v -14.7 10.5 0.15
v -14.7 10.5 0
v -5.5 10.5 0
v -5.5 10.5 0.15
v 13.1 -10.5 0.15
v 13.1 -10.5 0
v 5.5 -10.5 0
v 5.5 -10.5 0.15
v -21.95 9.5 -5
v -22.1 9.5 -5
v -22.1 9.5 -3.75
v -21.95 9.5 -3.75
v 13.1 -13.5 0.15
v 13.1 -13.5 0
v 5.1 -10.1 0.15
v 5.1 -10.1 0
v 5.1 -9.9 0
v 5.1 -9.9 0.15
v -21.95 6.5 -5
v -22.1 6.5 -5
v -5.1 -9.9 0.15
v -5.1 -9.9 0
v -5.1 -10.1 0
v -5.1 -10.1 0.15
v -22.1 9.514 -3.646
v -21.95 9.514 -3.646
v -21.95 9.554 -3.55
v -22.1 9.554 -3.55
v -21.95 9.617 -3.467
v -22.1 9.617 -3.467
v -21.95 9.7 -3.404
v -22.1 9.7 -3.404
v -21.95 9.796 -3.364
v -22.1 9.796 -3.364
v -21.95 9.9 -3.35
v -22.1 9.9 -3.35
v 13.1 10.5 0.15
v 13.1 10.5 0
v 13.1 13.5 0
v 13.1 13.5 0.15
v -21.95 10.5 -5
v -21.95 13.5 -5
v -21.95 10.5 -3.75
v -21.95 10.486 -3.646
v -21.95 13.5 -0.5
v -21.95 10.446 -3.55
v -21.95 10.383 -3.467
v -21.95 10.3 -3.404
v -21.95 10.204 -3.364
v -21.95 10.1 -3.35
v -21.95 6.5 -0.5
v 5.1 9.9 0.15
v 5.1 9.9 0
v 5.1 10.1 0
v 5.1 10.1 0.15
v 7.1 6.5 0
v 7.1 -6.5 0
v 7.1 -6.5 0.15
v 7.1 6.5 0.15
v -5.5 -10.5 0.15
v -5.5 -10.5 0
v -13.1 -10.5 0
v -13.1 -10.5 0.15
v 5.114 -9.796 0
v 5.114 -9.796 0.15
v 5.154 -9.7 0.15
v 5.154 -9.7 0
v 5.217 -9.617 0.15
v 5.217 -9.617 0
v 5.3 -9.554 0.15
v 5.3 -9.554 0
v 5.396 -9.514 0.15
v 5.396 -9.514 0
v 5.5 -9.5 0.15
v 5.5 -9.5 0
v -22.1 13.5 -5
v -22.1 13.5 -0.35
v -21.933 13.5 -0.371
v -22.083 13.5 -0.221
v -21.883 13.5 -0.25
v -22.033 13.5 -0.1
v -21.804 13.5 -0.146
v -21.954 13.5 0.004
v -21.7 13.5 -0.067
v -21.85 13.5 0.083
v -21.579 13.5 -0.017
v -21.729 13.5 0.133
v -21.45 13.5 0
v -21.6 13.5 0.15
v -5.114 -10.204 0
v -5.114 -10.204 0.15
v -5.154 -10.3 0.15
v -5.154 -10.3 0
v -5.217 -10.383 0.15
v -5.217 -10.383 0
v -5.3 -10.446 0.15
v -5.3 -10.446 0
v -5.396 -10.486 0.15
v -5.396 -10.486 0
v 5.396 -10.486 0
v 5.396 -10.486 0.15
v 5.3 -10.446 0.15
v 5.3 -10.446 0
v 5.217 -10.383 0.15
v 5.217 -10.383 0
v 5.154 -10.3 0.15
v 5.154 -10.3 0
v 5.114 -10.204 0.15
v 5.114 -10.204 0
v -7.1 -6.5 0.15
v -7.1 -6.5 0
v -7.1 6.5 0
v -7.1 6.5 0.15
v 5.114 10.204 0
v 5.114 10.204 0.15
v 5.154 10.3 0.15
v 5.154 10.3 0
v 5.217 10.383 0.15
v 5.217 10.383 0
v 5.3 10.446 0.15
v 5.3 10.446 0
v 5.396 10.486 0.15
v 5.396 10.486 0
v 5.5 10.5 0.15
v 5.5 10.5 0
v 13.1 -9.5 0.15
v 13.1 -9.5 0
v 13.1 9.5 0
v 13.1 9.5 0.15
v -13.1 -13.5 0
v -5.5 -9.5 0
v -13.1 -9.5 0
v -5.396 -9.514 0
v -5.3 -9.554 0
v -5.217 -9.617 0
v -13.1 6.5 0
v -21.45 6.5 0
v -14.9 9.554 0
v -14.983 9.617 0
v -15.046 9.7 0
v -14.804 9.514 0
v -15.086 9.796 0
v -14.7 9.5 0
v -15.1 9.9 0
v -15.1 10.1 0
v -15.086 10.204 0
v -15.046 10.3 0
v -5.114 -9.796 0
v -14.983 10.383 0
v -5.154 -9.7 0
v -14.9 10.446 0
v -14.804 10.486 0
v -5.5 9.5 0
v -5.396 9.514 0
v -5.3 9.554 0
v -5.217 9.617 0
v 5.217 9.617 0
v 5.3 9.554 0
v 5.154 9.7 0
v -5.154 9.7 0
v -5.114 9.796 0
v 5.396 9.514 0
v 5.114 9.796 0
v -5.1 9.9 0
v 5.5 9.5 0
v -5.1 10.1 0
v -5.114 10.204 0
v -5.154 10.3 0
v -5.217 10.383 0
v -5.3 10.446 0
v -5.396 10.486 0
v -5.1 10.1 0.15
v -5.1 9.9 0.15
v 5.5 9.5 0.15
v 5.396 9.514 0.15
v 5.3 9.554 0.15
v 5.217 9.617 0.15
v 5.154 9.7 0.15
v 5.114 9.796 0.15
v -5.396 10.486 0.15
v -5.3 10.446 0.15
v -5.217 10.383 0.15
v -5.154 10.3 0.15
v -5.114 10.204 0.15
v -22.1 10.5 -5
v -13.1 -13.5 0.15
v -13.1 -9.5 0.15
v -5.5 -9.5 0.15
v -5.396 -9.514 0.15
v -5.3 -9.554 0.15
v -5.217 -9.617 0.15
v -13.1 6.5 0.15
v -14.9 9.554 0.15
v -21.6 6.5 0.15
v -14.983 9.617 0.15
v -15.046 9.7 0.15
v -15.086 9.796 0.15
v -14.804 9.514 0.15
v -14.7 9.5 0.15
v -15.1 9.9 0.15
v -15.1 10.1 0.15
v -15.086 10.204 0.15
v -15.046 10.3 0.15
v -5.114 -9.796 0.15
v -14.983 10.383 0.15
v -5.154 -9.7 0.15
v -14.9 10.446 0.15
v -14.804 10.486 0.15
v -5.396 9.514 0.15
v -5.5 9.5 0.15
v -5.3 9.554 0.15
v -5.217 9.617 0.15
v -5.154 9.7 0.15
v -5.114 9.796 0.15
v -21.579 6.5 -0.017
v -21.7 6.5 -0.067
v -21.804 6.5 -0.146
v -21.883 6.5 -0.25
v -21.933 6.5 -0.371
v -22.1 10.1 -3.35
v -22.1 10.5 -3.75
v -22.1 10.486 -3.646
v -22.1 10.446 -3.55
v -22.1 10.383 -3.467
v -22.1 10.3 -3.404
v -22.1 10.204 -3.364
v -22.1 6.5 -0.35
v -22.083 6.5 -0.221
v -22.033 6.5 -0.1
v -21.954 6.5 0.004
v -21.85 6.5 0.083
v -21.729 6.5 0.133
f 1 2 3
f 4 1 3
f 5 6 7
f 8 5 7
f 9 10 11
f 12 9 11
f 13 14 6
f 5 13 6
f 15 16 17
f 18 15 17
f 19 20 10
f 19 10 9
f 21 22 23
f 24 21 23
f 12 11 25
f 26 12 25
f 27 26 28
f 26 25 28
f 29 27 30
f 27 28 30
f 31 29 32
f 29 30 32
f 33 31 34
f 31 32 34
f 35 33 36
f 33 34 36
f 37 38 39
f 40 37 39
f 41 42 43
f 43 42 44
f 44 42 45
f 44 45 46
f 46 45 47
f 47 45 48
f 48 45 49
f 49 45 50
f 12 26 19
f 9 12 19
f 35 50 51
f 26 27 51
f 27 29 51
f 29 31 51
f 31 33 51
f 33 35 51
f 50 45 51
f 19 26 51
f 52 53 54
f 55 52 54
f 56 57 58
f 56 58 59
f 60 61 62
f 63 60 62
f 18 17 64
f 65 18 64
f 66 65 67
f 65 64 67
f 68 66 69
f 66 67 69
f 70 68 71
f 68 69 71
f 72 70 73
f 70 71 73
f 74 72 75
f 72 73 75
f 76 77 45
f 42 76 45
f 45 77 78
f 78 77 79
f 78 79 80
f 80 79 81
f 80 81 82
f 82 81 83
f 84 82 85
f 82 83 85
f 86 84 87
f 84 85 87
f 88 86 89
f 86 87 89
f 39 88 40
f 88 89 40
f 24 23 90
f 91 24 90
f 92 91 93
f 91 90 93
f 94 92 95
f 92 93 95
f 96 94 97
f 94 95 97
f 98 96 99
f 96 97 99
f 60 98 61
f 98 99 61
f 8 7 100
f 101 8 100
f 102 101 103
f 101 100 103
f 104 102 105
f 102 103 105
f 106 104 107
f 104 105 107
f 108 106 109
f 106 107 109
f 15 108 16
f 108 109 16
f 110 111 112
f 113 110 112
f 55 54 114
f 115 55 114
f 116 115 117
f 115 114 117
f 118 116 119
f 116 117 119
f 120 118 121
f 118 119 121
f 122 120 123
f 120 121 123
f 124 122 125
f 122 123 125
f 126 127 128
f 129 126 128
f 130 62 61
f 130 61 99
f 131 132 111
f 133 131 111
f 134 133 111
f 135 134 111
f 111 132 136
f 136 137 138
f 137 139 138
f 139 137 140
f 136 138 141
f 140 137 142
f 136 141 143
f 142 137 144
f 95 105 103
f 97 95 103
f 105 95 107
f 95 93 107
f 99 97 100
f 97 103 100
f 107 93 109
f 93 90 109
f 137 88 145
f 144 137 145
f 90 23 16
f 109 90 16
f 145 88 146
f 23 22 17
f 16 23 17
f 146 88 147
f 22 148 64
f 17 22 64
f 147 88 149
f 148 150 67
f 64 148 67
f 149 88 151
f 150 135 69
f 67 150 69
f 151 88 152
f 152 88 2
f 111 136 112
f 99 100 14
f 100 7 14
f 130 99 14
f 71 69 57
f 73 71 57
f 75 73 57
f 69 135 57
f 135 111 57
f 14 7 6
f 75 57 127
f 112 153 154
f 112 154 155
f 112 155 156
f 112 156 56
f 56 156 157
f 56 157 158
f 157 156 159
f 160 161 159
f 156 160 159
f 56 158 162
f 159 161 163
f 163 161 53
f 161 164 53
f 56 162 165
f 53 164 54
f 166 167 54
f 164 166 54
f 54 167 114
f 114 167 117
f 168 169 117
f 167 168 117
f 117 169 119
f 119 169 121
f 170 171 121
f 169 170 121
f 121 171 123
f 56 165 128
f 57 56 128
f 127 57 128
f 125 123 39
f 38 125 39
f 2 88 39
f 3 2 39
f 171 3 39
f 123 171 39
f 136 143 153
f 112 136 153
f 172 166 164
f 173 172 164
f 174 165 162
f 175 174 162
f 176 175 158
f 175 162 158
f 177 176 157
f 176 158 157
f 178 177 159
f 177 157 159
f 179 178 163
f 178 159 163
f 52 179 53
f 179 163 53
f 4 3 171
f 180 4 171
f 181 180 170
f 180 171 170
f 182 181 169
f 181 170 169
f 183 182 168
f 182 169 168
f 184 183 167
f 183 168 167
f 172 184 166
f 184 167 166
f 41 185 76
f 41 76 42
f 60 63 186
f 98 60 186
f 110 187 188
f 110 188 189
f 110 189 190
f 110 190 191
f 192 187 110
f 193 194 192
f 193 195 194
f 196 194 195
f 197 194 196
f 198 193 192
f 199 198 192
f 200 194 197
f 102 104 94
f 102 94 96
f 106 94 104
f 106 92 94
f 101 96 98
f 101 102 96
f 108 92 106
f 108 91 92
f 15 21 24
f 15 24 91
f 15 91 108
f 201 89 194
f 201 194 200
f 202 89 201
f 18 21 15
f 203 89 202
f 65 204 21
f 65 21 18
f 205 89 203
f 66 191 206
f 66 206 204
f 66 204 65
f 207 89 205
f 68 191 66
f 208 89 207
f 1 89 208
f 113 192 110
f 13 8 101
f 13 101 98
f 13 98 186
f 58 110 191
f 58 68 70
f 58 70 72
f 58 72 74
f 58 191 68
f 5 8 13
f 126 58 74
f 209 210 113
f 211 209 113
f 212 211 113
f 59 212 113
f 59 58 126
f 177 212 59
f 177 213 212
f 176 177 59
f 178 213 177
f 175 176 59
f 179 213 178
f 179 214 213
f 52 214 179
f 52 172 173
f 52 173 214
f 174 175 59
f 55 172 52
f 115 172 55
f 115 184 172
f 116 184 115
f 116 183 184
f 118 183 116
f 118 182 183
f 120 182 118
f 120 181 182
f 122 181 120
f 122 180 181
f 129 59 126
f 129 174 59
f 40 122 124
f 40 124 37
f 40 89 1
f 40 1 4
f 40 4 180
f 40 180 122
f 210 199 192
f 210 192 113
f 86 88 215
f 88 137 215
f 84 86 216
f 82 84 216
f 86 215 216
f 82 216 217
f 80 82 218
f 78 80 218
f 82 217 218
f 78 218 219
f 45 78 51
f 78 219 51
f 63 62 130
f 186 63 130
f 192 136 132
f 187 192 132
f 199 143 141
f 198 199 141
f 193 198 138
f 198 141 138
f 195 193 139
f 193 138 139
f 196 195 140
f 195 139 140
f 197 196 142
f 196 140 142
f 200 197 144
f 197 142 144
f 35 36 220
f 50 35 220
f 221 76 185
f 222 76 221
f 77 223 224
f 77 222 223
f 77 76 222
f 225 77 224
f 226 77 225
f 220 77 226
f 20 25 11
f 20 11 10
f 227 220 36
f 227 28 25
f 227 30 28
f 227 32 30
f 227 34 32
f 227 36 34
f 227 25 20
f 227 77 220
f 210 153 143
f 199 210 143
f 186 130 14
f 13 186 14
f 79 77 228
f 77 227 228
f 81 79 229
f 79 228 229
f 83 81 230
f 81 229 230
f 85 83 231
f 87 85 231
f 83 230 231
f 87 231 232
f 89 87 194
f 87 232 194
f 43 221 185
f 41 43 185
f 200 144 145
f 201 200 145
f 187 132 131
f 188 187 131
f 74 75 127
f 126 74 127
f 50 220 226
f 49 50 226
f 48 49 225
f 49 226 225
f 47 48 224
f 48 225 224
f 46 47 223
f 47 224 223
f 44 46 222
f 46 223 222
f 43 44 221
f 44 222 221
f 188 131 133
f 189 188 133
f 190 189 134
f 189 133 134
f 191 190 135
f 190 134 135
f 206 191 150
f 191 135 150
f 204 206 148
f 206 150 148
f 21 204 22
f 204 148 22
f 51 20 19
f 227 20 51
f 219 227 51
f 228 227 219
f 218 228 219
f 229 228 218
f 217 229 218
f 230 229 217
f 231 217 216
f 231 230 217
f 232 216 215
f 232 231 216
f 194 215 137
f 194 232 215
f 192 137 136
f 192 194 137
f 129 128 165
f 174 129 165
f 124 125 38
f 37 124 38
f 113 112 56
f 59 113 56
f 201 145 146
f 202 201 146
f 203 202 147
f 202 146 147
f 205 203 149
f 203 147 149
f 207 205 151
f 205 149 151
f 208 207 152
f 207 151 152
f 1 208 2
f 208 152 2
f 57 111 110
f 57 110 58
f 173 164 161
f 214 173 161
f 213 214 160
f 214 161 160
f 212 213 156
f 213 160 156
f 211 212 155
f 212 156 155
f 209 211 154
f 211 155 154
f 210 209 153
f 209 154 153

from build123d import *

# Parameters (mm, degrees)
F0_W     = 14.2
F0_H     = 13
F1_DEPTH = 0.15
F2_W     = 0.15
F2_H     = 7
F3_DEPTH = 5
F4_R     = 0.5
F6_DEPTH = 25


# Not quite as in the source:
# - a feature names something its author has since deleted; it is built from what else it names


with BuildPart() as f1:
    # F0 (on Top) → F1 (new body)
    with BuildSketch(Plane.XY):
        with BuildLine():
            Line((-13.1, 10.5), (-13.1, 13.5))
            Line((-13.1, 13.5), (-22.1, 13.5))
            Line((-22.1, 13.5), (-22.1, 6.5))
            Line((-22.1, 6.5), (-13.1, 6.5))
            Line((-13.1, 6.5), (-13.1, 9.5))
            Line((-13.1, 9.5), (-14.7, 9.5))
            ThreePointArc((-14.7, 9.5), (-14.9828427125, 9.6171572875), (-15.1, 9.9))
            Line((-15.1, 9.9), (-15.1, 10.1))
            ThreePointArc((-15.1, 10.1), (-14.9828427125, 10.3828427125), (-14.7, 10.5))
            Line((-14.7, 10.5), (-13.1, 10.5))
        make_face()
        with BuildLine():
            Line((13.1, 10.5), (13.1, 13.5))
            Line((13.1, 13.5), (-7.1, 13.5))
            Line((-7.1, 13.5), (-13.1, 13.5))
            Line((-13.1, 13.5), (-13.1, 10.5))
            Line((-13.1, 10.5), (-5.5, 10.5))
            ThreePointArc((-5.5, 10.5), (-5.2171572875, 10.3828427125), (-5.1, 10.1))
            Line((-5.1, 10.1), (-5.1, 9.9))
            ThreePointArc((-5.1, 9.9), (-5.2171572875, 9.6171572875), (-5.5, 9.5))
            Line((-5.5, 9.5), (-13.1, 9.5))
            Line((-13.1, 9.5), (-13.1, 6.5))
            Line((-13.1, 6.5), (-13.1, 0))
            Line((-13.1, 0), (-13.1, -6.5))
            Line((-13.1, -6.5), (-13.1, -9.5))
            Line((-13.1, -9.5), (-5.5, -9.5))
            ThreePointArc((-5.5, -9.5), (-5.2171572875, -9.6171572875), (-5.1, -9.9))
            Line((-5.1, -9.9), (-5.1, -10.1))
            ThreePointArc((-5.1, -10.1), (-5.2171572875, -10.3828427125), (-5.5, -10.5))
            Line((-5.5, -10.5), (-13.1, -10.5))
            Line((-13.1, -10.5), (-13.1, -13.5))
            Line((-13.1, -13.5), (-7.1, -13.5))
            Line((-7.1, -13.5), (13.1, -13.5))
            Line((13.1, -13.5), (13.1, -10.5))
            Line((13.1, -10.5), (5.5, -10.5))
            ThreePointArc((5.5, -10.5), (5.2171572875, -10.3828427125), (5.1, -10.1))
            Line((5.1, -10.1), (5.1, -9.9))
            ThreePointArc((5.1, -9.9), (5.2171572875, -9.6171572875), (5.5, -9.5))
            Line((5.5, -9.5), (13.1, -9.5))
            Line((13.1, -9.5), (13.1, 0))
            Line((13.1, 0), (13.1, 9.5))
            Line((13.1, 9.5), (5.5, 9.5))
            ThreePointArc((5.5, 9.5), (5.2171572875, 9.6171572875), (5.1, 9.9))
            Line((5.1, 9.9), (5.1, 10.1))
            ThreePointArc((5.1, 10.1), (5.2171572875, 10.3828427125), (5.5, 10.5))
            Line((5.5, 10.5), (13.1, 10.5))
        make_face()
        Rectangle(F0_W, F0_H, mode=Mode.SUBTRACT)
    extrude(amount=F1_DEPTH)

    # F2 (on face) → F3 (join)
    with BuildSketch(Plane(origin=(0, 0, 0), x_dir=(1, 0, 0), z_dir=(0, 0, -1))):
        with Locations((-22.025, -10)):
            Rectangle(F2_W, F2_H)
    extrude(amount=F3_DEPTH)

    # F4
    f4_edges = [f1.edges().sort_by_distance(p)[0] for p in [
        (-21.95, 10, 0),
        (-22.1, 10, 0.15),
    ]]
    fillet(f4_edges, radius=F4_R)

    # F5 (on face) → F6 (cut)
    with BuildSketch(Plane(origin=(-22.1, 0, 0), x_dir=(0, -1, 0), z_dir=(-1, 0, 0))):
        with BuildLine():
            Line((-9.9, -3.35), (-10, -3.35))
            Line((-10, -3.35), (-10.1, -3.35))
            ThreePointArc((-10.1, -3.35), (-10.3828427125, -3.4671572875), (-10.5, -3.75))
            Line((-10.5, -3.75), (-10.5, -5))
            Line((-10.5, -5), (-9.5, -5))
            Line((-9.5, -5), (-9.5, -3.75))
            ThreePointArc((-9.5, -3.75), (-9.6171572875, -3.4671572875), (-9.9, -3.35))
        make_face()
    extrude(amount=-F6_DEPTH, mode=Mode.SUBTRACT)


solid = f1.part
